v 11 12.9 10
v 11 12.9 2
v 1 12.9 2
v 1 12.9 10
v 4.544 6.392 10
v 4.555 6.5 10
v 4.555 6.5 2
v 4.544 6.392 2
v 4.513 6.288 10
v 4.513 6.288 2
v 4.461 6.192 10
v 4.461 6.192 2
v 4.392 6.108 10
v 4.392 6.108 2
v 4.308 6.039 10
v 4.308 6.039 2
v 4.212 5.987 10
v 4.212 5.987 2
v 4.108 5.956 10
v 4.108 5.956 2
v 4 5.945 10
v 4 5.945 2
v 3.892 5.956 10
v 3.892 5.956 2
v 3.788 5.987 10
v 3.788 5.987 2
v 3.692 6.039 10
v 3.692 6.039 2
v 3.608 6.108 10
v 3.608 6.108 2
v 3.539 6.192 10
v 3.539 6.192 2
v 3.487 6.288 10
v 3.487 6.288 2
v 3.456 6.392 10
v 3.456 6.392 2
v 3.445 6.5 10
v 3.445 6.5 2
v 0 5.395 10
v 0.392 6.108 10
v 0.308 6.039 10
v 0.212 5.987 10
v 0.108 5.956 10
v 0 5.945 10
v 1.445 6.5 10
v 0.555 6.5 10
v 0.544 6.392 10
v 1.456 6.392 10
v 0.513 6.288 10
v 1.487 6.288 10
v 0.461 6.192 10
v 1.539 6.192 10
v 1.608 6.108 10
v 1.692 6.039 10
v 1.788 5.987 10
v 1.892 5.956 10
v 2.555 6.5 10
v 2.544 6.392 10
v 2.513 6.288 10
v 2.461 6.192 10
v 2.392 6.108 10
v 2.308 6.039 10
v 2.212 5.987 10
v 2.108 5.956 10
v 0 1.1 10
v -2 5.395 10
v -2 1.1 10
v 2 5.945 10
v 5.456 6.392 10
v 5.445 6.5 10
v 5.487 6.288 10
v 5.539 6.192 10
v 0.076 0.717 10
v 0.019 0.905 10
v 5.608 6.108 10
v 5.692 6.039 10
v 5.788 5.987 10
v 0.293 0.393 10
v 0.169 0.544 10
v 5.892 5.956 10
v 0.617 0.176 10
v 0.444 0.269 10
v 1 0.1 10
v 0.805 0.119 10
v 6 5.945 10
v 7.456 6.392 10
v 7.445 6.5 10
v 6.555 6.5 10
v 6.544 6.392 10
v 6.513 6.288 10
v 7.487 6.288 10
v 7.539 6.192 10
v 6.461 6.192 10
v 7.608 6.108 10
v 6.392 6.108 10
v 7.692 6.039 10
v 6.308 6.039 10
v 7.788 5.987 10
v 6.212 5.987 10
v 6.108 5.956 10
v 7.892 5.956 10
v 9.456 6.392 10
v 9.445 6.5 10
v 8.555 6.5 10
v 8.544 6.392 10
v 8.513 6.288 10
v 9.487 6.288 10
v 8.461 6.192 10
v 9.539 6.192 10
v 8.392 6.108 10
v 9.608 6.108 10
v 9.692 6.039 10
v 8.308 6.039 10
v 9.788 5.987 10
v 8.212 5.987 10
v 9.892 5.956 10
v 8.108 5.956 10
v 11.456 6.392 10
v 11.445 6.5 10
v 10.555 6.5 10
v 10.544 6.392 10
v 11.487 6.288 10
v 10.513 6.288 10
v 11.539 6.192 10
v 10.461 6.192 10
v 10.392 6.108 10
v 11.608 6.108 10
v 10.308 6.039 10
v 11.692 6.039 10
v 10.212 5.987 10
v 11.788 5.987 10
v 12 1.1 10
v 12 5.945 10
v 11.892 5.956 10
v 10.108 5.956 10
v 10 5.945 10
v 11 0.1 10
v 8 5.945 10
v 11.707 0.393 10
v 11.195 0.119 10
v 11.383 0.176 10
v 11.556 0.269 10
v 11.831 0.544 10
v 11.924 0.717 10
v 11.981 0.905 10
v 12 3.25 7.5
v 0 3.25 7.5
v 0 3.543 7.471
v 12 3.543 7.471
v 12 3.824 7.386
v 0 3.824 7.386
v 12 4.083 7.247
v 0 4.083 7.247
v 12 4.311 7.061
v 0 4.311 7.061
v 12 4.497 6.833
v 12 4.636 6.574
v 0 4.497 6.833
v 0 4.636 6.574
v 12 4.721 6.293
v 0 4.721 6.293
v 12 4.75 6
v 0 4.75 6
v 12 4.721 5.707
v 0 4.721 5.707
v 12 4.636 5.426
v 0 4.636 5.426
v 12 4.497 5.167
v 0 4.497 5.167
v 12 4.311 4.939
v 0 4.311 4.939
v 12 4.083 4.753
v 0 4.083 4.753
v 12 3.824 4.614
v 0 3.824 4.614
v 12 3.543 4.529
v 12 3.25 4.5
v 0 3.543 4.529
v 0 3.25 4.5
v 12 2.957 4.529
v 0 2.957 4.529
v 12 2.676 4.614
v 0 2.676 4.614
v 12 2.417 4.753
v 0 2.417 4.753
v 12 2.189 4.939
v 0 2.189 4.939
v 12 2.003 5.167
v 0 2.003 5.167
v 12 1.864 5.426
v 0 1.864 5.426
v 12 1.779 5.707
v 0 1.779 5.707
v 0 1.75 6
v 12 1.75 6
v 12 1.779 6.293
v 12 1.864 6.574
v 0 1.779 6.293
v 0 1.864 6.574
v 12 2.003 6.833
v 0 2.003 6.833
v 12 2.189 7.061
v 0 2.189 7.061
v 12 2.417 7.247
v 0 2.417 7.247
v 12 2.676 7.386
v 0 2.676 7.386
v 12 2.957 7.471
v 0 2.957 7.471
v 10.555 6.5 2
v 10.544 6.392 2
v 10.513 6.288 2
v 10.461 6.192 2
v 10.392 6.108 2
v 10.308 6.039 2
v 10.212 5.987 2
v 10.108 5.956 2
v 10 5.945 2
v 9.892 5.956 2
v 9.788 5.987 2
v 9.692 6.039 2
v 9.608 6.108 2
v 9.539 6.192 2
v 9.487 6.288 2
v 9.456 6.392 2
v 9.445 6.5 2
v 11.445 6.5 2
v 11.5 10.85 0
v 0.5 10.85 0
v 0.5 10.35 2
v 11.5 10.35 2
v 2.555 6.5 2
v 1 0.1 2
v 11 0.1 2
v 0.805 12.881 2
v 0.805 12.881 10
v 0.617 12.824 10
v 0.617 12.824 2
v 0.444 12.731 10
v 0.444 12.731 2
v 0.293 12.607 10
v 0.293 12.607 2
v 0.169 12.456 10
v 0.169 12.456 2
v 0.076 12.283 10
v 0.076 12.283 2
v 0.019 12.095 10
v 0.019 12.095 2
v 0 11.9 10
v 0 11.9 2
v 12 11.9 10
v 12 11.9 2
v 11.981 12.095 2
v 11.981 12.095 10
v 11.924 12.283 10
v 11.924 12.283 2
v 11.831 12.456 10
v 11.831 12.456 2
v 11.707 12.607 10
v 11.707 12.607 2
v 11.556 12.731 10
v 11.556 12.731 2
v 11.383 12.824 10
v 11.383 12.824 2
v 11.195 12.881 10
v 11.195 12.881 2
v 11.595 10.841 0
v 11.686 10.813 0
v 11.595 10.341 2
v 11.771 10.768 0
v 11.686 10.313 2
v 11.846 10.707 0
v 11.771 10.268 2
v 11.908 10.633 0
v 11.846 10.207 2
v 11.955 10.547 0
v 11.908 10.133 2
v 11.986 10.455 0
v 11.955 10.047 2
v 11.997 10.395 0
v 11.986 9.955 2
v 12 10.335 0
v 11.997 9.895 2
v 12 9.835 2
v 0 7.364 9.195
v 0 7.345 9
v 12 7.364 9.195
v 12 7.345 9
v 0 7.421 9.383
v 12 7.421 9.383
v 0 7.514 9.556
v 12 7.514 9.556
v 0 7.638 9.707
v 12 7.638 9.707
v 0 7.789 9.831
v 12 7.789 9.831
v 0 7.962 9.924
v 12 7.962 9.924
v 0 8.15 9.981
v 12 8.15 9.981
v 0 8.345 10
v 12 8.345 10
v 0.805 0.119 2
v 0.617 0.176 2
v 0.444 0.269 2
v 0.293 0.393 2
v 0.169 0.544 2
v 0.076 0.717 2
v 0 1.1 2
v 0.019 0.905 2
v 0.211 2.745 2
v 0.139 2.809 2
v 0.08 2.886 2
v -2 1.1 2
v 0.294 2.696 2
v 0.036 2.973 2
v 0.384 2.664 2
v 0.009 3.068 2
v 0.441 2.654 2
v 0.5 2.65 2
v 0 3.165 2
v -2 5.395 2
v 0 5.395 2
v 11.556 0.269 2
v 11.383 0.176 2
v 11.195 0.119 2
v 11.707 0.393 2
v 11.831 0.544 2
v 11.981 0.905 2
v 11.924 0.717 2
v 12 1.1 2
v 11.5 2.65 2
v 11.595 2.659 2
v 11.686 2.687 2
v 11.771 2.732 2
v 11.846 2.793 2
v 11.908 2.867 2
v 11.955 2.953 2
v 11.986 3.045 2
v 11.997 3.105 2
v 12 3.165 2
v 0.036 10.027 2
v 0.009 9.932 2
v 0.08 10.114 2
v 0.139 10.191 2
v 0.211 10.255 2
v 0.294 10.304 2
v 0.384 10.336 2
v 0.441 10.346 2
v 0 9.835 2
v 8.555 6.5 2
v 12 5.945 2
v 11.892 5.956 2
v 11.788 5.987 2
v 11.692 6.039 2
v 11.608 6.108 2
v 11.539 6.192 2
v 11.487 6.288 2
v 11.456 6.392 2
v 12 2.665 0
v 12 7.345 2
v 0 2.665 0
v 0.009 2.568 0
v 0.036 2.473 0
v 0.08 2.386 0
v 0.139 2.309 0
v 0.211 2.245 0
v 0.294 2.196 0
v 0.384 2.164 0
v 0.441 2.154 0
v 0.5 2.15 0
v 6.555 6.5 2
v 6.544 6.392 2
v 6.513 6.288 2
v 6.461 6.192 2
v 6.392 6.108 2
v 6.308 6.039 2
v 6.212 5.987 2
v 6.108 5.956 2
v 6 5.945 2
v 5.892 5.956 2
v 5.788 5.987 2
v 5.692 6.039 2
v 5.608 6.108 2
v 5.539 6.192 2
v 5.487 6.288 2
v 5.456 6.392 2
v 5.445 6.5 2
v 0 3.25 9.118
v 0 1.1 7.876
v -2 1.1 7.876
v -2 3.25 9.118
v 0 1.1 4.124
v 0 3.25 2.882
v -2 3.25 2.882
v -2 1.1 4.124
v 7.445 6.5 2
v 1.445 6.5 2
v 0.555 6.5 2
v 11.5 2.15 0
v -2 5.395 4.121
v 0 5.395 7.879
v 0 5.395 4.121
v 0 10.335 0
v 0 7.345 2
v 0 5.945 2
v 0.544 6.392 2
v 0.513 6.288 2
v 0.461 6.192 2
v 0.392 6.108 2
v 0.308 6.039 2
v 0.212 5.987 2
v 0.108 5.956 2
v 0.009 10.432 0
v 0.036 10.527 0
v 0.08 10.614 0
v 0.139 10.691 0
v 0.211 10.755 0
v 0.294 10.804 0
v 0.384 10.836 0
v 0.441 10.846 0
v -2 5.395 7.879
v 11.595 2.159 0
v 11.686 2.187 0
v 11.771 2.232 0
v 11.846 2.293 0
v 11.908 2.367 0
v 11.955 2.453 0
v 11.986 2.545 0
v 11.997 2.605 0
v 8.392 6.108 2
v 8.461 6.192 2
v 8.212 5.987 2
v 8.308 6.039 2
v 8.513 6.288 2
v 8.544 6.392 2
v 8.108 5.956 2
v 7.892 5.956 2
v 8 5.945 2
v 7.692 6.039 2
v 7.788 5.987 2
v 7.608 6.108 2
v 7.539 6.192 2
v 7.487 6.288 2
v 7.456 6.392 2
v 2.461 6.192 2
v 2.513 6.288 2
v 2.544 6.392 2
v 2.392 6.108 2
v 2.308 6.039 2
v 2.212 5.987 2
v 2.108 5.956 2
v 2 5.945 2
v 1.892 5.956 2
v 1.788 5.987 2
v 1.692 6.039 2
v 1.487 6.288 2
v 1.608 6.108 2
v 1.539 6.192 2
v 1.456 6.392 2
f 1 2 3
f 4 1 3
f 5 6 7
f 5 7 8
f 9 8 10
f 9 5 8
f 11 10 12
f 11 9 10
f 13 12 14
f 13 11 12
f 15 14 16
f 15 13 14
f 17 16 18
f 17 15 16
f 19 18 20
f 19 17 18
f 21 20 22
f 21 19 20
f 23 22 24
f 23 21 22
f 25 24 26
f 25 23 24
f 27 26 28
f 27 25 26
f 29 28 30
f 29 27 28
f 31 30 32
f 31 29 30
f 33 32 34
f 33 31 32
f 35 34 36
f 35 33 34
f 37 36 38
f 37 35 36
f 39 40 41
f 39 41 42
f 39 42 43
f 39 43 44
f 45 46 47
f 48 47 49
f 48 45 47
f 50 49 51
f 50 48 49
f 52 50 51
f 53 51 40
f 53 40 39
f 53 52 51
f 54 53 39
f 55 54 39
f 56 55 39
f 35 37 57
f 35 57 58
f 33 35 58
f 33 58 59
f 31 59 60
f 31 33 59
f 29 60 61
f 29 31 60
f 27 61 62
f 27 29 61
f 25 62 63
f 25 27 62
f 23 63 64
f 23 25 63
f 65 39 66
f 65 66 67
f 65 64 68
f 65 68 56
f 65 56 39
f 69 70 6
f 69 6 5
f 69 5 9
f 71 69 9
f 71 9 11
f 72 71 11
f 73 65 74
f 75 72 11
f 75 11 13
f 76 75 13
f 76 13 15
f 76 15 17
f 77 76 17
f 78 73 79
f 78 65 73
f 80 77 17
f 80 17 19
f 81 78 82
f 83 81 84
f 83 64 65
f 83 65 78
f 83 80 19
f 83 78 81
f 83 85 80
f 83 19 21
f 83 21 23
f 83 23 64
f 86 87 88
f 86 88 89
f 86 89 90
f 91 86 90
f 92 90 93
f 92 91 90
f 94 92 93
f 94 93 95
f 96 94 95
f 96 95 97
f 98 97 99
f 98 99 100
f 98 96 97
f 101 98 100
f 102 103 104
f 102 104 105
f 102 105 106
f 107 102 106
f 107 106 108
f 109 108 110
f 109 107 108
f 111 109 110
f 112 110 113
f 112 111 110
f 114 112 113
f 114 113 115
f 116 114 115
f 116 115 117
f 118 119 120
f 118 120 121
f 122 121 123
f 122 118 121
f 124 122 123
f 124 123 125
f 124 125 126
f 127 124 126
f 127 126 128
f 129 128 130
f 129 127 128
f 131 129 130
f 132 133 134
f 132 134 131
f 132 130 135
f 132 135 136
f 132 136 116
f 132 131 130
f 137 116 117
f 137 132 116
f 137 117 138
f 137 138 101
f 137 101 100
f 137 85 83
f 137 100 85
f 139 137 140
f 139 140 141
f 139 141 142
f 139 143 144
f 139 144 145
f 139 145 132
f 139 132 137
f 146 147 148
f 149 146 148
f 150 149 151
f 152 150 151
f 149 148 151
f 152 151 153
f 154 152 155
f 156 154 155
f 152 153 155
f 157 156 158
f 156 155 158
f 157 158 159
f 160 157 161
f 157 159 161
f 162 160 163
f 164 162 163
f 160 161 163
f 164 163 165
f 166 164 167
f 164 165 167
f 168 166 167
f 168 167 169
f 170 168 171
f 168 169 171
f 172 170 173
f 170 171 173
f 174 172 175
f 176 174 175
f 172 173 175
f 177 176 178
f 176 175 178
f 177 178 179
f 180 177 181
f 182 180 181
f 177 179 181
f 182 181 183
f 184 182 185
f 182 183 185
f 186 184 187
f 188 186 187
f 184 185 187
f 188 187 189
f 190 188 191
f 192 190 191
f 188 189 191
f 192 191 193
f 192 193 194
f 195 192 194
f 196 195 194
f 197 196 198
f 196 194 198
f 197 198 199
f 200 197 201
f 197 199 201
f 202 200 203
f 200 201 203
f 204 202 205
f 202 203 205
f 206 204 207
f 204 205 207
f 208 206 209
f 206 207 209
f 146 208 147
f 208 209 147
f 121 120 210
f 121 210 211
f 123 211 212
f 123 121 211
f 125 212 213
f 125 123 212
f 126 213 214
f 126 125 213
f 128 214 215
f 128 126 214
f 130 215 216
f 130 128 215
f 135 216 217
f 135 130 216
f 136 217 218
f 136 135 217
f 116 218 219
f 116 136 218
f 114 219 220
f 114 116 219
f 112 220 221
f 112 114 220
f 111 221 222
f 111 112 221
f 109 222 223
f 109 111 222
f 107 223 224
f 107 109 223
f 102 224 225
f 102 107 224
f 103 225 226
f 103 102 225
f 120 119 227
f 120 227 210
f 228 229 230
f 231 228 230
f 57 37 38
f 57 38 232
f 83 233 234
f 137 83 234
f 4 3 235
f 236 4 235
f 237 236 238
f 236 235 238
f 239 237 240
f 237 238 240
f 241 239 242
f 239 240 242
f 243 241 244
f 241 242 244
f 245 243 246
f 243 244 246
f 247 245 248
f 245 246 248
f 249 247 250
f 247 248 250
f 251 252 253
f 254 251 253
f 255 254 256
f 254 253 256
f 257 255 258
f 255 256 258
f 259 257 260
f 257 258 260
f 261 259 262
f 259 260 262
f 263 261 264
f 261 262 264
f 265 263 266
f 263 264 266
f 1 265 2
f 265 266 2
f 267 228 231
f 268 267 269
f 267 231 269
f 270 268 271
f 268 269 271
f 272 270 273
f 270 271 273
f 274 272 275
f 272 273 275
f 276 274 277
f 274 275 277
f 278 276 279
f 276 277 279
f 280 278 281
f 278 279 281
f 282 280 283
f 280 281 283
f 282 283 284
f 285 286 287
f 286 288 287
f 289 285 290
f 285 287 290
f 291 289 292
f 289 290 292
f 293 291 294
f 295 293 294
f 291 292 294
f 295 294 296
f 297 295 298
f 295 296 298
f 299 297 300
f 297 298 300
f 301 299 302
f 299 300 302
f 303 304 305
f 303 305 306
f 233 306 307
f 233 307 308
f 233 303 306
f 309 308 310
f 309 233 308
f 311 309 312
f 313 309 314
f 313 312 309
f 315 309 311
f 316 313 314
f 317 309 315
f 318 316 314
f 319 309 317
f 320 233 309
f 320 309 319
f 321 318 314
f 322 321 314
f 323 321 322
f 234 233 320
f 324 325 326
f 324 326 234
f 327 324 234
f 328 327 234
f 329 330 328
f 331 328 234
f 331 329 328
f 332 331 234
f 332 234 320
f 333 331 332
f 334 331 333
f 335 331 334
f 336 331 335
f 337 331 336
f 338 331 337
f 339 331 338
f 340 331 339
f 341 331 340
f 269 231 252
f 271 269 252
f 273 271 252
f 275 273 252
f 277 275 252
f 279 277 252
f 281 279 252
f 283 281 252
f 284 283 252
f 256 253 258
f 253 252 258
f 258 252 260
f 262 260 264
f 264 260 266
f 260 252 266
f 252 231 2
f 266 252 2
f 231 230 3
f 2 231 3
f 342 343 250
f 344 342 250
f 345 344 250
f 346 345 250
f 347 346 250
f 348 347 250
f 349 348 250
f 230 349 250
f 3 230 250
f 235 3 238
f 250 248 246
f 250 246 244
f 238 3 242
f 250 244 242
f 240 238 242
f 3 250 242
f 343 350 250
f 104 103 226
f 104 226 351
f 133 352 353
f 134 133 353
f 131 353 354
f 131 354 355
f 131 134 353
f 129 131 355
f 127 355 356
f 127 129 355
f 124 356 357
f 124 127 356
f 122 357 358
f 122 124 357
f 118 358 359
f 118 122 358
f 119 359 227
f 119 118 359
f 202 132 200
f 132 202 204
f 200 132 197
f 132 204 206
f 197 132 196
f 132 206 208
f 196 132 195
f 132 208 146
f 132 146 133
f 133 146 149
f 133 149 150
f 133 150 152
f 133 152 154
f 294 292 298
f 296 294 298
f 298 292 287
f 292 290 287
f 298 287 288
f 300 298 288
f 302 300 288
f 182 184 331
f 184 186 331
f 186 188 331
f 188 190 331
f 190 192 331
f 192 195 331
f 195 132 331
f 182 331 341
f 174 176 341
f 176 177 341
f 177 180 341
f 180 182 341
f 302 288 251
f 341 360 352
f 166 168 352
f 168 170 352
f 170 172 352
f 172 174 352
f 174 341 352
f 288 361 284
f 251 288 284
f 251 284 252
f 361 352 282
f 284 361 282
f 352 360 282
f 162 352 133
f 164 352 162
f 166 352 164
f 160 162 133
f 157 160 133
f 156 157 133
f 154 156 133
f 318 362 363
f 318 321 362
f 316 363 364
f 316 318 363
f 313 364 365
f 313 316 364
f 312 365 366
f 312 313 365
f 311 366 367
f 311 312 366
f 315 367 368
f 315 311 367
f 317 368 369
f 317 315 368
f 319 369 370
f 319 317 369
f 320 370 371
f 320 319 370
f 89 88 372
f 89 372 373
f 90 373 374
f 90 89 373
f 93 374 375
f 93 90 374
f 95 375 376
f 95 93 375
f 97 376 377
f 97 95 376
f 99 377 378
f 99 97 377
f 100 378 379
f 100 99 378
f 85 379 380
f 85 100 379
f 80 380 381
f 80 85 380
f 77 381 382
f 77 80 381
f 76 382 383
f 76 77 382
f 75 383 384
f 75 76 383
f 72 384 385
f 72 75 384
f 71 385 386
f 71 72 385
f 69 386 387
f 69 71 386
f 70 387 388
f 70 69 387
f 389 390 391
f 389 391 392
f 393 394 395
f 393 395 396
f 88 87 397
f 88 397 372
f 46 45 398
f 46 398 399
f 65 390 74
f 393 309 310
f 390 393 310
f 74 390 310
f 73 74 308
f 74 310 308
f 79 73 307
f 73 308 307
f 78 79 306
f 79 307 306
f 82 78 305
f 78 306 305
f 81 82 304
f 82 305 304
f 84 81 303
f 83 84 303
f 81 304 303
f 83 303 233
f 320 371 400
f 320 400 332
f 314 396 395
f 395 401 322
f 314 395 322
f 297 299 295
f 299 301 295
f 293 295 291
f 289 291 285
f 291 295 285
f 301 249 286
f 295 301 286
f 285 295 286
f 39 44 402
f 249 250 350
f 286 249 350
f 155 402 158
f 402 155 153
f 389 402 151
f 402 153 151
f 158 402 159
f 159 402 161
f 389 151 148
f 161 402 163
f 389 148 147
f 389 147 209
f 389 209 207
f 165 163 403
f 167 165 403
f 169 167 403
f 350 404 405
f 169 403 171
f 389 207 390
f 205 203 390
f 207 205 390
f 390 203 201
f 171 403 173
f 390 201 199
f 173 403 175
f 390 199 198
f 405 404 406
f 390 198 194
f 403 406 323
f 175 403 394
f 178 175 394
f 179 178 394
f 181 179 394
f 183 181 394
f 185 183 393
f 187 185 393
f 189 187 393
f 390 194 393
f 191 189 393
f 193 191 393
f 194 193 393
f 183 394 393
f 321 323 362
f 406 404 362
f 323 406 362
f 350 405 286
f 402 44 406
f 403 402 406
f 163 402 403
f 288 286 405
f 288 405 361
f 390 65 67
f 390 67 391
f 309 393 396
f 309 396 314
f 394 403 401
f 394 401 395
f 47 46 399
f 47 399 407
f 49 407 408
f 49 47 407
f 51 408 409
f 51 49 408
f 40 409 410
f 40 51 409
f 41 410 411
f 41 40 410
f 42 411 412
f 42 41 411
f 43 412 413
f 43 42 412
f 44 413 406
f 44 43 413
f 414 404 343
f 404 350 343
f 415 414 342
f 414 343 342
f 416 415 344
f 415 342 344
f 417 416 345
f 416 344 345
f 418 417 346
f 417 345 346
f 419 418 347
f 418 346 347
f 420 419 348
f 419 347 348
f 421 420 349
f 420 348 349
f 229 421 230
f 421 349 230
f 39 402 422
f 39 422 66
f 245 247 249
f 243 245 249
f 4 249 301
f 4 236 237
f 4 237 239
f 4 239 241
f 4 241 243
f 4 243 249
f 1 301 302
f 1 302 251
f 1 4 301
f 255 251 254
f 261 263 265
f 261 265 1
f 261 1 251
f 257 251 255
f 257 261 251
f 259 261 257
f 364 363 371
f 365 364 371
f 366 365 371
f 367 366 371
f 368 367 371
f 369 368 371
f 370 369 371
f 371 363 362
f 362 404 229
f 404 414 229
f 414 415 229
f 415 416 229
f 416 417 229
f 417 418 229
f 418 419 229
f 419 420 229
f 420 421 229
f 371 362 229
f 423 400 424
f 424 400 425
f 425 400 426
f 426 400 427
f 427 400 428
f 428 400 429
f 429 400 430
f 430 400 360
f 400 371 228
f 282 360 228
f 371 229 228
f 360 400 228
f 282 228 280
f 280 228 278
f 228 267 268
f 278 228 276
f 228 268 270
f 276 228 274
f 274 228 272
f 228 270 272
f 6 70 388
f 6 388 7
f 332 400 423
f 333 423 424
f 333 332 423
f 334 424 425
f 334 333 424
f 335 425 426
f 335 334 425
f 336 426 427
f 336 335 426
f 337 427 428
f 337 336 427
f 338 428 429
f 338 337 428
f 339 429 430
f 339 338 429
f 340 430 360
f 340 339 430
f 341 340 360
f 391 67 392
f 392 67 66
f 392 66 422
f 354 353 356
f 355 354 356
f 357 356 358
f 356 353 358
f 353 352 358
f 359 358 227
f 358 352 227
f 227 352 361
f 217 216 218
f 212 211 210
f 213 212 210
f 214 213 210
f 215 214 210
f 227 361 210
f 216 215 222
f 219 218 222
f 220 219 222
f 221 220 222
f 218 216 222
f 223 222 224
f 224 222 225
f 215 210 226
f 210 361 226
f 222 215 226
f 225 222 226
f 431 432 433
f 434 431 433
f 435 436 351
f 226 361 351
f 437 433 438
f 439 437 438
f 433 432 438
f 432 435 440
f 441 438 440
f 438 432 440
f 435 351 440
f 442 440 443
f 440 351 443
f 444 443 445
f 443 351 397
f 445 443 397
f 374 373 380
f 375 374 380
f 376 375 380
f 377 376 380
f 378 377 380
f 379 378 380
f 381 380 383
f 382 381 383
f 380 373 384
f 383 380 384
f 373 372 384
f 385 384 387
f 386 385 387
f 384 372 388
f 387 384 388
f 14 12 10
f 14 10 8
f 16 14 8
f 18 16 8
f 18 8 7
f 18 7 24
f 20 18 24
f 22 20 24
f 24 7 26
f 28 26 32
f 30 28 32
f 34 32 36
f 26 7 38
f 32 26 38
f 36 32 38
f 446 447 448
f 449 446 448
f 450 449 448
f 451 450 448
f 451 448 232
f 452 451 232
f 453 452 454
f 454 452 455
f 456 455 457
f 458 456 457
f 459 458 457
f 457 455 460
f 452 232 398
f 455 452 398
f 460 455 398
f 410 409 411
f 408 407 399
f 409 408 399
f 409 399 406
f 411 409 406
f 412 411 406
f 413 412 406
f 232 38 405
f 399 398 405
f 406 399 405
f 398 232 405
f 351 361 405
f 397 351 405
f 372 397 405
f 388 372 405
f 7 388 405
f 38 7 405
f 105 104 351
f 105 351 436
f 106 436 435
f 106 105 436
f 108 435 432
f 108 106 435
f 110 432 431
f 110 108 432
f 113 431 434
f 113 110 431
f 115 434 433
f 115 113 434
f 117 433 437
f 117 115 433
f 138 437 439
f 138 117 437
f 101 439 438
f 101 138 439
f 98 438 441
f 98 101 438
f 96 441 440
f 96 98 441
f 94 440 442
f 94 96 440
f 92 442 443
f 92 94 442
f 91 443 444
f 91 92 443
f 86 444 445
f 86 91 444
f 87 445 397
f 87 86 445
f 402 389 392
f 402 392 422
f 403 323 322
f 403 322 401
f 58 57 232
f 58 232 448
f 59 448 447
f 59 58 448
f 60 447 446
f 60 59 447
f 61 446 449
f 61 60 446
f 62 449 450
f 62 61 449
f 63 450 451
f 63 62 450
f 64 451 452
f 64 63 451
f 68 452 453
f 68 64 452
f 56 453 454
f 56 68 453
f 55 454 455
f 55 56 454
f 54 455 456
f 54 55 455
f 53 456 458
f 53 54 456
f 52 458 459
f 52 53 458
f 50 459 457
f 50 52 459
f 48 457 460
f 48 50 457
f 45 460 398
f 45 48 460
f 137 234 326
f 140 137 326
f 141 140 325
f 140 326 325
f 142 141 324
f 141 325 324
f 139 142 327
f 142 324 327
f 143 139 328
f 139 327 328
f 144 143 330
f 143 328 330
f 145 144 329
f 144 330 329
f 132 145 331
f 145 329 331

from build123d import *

# Parameters (mm, degrees)
BOSS_EXTRUDE1_DEPTH = 10
CUT_EXTRUDE1_DEPTH  = 8
SKETCH6_R           = 1.5
CUT_EXTRUDE2_DEPTH  = 12
FILLET1_R           = 1
BOSS_EXTRUDE2_DEPTH = 2
FILLET2_R           = 0.5


with BuildPart() as part:
    # Sketch4 → Boss-Extrude1 (new body)
    with BuildSketch(Plane.XY):
        with BuildLine():
            Line((1, 0.1), (11, 0.1))
            ThreePointArc((11, 0.1), (11.707106781, 0.392893219), (12, 1.1))
            Line((12, 1.1), (12, 11.9))
            ThreePointArc((12, 11.9), (11.707106781, 12.607106781), (11, 12.9))
            Line((11, 12.9), (1, 12.9))
            ThreePointArc((1, 12.9), (0.292893219, 12.607106781), (0, 11.9))
            Line((0, 11.9), (0, 1.1))
            ThreePointArc((0, 1.1), (0.292893219, 0.392893219), (1, 0.1))
        make_face()
    extrude(amount=BOSS_EXTRUDE1_DEPTH)

    # Sketch5 → Cut-Extrude1 (cut)
    with BuildSketch(Plane.XY.offset(10)):
        with BuildLine():
            Line((11.445, 6.5), (10.555, 6.5))
            ThreePointArc((10.555, 6.5), (10, 5.945), (9.445, 6.5))
            Line((9.445, 6.5), (8.555, 6.5))
            ThreePointArc((8.555, 6.5), (8, 5.945), (7.445, 6.5))
            Line((7.445, 6.5), (6.555, 6.5))
            ThreePointArc((6.555, 6.5), (6, 5.945), (5.445, 6.5))
            Line((5.445, 6.5), (4.555, 6.5))
            ThreePointArc((4.555, 6.5), (4, 5.945), (3.445, 6.5))
            Line((3.445, 6.5), (2.555, 6.5))
            ThreePointArc((2.555, 6.5), (2, 5.945), (1.445, 6.5))
            Line((1.445, 6.5), (0.555, 6.5))
            ThreePointArc((0.555, 6.5), (0.392444264, 6.107555736), (0, 5.945))
            Line((0, 5.945), (0, 7.345))
            Line((0, 7.345), (12, 7.345))
            Line((12, 7.345), (12, 5.945))
            ThreePointArc((12, 5.945), (11.607555736, 6.107555736), (11.445, 6.5))
        make_face()
    extrude(amount=-CUT_EXTRUDE1_DEPTH, mode=Mode.SUBTRACT)

    # Sketch6 → Cut-Extrude2 (cut)
    with BuildSketch(Plane.ZY):
        with Locations((6, 3.25)):
            Circle(SKETCH6_R)
        Polygon((2, 2.65), (2, 0.1), (0, 0.1), (0, 2.15), align=None)
        Polygon((0, 12.9), (0, 10.85), (2, 10.35), (2, 12.9), align=None)
    extrude(amount=-CUT_EXTRUDE2_DEPTH, mode=Mode.SUBTRACT)

    # Fillet1
    fillet1_edges = [part.edges().sort_by_distance(p)[0] for p in [
        (6, 7.345, 10),
    ]]
    fillet(fillet1_edges, radius=FILLET1_R)

    # Sketch7 → Boss-Extrude2 (add)
    with BuildSketch(Plane.ZY):
        Polygon((7.876388375, 1.1), (9.117691454, 3.25), (7.879275126, 5.395), (10, 5.395), (10, 1.1), align=None)
        Polygon((2, 1.1), (2, 5.395), (4.120724874, 5.395), (2.882308546, 3.25), (4.123611625, 1.1), align=None)
    extrude(amount=BOSS_EXTRUDE2_DEPTH)

    # Fillet2
    fillet2_edges = [part.edges().sort_by_distance(p)[0] for p in [
        (12, 2.4, 1),
        (0, 10.6, 1),
        (12, 10.6, 1),
        (0, 2.4, 1),
    ]]
    fillet(fillet2_edges, radius=FILLET2_R)


solid = part.part
